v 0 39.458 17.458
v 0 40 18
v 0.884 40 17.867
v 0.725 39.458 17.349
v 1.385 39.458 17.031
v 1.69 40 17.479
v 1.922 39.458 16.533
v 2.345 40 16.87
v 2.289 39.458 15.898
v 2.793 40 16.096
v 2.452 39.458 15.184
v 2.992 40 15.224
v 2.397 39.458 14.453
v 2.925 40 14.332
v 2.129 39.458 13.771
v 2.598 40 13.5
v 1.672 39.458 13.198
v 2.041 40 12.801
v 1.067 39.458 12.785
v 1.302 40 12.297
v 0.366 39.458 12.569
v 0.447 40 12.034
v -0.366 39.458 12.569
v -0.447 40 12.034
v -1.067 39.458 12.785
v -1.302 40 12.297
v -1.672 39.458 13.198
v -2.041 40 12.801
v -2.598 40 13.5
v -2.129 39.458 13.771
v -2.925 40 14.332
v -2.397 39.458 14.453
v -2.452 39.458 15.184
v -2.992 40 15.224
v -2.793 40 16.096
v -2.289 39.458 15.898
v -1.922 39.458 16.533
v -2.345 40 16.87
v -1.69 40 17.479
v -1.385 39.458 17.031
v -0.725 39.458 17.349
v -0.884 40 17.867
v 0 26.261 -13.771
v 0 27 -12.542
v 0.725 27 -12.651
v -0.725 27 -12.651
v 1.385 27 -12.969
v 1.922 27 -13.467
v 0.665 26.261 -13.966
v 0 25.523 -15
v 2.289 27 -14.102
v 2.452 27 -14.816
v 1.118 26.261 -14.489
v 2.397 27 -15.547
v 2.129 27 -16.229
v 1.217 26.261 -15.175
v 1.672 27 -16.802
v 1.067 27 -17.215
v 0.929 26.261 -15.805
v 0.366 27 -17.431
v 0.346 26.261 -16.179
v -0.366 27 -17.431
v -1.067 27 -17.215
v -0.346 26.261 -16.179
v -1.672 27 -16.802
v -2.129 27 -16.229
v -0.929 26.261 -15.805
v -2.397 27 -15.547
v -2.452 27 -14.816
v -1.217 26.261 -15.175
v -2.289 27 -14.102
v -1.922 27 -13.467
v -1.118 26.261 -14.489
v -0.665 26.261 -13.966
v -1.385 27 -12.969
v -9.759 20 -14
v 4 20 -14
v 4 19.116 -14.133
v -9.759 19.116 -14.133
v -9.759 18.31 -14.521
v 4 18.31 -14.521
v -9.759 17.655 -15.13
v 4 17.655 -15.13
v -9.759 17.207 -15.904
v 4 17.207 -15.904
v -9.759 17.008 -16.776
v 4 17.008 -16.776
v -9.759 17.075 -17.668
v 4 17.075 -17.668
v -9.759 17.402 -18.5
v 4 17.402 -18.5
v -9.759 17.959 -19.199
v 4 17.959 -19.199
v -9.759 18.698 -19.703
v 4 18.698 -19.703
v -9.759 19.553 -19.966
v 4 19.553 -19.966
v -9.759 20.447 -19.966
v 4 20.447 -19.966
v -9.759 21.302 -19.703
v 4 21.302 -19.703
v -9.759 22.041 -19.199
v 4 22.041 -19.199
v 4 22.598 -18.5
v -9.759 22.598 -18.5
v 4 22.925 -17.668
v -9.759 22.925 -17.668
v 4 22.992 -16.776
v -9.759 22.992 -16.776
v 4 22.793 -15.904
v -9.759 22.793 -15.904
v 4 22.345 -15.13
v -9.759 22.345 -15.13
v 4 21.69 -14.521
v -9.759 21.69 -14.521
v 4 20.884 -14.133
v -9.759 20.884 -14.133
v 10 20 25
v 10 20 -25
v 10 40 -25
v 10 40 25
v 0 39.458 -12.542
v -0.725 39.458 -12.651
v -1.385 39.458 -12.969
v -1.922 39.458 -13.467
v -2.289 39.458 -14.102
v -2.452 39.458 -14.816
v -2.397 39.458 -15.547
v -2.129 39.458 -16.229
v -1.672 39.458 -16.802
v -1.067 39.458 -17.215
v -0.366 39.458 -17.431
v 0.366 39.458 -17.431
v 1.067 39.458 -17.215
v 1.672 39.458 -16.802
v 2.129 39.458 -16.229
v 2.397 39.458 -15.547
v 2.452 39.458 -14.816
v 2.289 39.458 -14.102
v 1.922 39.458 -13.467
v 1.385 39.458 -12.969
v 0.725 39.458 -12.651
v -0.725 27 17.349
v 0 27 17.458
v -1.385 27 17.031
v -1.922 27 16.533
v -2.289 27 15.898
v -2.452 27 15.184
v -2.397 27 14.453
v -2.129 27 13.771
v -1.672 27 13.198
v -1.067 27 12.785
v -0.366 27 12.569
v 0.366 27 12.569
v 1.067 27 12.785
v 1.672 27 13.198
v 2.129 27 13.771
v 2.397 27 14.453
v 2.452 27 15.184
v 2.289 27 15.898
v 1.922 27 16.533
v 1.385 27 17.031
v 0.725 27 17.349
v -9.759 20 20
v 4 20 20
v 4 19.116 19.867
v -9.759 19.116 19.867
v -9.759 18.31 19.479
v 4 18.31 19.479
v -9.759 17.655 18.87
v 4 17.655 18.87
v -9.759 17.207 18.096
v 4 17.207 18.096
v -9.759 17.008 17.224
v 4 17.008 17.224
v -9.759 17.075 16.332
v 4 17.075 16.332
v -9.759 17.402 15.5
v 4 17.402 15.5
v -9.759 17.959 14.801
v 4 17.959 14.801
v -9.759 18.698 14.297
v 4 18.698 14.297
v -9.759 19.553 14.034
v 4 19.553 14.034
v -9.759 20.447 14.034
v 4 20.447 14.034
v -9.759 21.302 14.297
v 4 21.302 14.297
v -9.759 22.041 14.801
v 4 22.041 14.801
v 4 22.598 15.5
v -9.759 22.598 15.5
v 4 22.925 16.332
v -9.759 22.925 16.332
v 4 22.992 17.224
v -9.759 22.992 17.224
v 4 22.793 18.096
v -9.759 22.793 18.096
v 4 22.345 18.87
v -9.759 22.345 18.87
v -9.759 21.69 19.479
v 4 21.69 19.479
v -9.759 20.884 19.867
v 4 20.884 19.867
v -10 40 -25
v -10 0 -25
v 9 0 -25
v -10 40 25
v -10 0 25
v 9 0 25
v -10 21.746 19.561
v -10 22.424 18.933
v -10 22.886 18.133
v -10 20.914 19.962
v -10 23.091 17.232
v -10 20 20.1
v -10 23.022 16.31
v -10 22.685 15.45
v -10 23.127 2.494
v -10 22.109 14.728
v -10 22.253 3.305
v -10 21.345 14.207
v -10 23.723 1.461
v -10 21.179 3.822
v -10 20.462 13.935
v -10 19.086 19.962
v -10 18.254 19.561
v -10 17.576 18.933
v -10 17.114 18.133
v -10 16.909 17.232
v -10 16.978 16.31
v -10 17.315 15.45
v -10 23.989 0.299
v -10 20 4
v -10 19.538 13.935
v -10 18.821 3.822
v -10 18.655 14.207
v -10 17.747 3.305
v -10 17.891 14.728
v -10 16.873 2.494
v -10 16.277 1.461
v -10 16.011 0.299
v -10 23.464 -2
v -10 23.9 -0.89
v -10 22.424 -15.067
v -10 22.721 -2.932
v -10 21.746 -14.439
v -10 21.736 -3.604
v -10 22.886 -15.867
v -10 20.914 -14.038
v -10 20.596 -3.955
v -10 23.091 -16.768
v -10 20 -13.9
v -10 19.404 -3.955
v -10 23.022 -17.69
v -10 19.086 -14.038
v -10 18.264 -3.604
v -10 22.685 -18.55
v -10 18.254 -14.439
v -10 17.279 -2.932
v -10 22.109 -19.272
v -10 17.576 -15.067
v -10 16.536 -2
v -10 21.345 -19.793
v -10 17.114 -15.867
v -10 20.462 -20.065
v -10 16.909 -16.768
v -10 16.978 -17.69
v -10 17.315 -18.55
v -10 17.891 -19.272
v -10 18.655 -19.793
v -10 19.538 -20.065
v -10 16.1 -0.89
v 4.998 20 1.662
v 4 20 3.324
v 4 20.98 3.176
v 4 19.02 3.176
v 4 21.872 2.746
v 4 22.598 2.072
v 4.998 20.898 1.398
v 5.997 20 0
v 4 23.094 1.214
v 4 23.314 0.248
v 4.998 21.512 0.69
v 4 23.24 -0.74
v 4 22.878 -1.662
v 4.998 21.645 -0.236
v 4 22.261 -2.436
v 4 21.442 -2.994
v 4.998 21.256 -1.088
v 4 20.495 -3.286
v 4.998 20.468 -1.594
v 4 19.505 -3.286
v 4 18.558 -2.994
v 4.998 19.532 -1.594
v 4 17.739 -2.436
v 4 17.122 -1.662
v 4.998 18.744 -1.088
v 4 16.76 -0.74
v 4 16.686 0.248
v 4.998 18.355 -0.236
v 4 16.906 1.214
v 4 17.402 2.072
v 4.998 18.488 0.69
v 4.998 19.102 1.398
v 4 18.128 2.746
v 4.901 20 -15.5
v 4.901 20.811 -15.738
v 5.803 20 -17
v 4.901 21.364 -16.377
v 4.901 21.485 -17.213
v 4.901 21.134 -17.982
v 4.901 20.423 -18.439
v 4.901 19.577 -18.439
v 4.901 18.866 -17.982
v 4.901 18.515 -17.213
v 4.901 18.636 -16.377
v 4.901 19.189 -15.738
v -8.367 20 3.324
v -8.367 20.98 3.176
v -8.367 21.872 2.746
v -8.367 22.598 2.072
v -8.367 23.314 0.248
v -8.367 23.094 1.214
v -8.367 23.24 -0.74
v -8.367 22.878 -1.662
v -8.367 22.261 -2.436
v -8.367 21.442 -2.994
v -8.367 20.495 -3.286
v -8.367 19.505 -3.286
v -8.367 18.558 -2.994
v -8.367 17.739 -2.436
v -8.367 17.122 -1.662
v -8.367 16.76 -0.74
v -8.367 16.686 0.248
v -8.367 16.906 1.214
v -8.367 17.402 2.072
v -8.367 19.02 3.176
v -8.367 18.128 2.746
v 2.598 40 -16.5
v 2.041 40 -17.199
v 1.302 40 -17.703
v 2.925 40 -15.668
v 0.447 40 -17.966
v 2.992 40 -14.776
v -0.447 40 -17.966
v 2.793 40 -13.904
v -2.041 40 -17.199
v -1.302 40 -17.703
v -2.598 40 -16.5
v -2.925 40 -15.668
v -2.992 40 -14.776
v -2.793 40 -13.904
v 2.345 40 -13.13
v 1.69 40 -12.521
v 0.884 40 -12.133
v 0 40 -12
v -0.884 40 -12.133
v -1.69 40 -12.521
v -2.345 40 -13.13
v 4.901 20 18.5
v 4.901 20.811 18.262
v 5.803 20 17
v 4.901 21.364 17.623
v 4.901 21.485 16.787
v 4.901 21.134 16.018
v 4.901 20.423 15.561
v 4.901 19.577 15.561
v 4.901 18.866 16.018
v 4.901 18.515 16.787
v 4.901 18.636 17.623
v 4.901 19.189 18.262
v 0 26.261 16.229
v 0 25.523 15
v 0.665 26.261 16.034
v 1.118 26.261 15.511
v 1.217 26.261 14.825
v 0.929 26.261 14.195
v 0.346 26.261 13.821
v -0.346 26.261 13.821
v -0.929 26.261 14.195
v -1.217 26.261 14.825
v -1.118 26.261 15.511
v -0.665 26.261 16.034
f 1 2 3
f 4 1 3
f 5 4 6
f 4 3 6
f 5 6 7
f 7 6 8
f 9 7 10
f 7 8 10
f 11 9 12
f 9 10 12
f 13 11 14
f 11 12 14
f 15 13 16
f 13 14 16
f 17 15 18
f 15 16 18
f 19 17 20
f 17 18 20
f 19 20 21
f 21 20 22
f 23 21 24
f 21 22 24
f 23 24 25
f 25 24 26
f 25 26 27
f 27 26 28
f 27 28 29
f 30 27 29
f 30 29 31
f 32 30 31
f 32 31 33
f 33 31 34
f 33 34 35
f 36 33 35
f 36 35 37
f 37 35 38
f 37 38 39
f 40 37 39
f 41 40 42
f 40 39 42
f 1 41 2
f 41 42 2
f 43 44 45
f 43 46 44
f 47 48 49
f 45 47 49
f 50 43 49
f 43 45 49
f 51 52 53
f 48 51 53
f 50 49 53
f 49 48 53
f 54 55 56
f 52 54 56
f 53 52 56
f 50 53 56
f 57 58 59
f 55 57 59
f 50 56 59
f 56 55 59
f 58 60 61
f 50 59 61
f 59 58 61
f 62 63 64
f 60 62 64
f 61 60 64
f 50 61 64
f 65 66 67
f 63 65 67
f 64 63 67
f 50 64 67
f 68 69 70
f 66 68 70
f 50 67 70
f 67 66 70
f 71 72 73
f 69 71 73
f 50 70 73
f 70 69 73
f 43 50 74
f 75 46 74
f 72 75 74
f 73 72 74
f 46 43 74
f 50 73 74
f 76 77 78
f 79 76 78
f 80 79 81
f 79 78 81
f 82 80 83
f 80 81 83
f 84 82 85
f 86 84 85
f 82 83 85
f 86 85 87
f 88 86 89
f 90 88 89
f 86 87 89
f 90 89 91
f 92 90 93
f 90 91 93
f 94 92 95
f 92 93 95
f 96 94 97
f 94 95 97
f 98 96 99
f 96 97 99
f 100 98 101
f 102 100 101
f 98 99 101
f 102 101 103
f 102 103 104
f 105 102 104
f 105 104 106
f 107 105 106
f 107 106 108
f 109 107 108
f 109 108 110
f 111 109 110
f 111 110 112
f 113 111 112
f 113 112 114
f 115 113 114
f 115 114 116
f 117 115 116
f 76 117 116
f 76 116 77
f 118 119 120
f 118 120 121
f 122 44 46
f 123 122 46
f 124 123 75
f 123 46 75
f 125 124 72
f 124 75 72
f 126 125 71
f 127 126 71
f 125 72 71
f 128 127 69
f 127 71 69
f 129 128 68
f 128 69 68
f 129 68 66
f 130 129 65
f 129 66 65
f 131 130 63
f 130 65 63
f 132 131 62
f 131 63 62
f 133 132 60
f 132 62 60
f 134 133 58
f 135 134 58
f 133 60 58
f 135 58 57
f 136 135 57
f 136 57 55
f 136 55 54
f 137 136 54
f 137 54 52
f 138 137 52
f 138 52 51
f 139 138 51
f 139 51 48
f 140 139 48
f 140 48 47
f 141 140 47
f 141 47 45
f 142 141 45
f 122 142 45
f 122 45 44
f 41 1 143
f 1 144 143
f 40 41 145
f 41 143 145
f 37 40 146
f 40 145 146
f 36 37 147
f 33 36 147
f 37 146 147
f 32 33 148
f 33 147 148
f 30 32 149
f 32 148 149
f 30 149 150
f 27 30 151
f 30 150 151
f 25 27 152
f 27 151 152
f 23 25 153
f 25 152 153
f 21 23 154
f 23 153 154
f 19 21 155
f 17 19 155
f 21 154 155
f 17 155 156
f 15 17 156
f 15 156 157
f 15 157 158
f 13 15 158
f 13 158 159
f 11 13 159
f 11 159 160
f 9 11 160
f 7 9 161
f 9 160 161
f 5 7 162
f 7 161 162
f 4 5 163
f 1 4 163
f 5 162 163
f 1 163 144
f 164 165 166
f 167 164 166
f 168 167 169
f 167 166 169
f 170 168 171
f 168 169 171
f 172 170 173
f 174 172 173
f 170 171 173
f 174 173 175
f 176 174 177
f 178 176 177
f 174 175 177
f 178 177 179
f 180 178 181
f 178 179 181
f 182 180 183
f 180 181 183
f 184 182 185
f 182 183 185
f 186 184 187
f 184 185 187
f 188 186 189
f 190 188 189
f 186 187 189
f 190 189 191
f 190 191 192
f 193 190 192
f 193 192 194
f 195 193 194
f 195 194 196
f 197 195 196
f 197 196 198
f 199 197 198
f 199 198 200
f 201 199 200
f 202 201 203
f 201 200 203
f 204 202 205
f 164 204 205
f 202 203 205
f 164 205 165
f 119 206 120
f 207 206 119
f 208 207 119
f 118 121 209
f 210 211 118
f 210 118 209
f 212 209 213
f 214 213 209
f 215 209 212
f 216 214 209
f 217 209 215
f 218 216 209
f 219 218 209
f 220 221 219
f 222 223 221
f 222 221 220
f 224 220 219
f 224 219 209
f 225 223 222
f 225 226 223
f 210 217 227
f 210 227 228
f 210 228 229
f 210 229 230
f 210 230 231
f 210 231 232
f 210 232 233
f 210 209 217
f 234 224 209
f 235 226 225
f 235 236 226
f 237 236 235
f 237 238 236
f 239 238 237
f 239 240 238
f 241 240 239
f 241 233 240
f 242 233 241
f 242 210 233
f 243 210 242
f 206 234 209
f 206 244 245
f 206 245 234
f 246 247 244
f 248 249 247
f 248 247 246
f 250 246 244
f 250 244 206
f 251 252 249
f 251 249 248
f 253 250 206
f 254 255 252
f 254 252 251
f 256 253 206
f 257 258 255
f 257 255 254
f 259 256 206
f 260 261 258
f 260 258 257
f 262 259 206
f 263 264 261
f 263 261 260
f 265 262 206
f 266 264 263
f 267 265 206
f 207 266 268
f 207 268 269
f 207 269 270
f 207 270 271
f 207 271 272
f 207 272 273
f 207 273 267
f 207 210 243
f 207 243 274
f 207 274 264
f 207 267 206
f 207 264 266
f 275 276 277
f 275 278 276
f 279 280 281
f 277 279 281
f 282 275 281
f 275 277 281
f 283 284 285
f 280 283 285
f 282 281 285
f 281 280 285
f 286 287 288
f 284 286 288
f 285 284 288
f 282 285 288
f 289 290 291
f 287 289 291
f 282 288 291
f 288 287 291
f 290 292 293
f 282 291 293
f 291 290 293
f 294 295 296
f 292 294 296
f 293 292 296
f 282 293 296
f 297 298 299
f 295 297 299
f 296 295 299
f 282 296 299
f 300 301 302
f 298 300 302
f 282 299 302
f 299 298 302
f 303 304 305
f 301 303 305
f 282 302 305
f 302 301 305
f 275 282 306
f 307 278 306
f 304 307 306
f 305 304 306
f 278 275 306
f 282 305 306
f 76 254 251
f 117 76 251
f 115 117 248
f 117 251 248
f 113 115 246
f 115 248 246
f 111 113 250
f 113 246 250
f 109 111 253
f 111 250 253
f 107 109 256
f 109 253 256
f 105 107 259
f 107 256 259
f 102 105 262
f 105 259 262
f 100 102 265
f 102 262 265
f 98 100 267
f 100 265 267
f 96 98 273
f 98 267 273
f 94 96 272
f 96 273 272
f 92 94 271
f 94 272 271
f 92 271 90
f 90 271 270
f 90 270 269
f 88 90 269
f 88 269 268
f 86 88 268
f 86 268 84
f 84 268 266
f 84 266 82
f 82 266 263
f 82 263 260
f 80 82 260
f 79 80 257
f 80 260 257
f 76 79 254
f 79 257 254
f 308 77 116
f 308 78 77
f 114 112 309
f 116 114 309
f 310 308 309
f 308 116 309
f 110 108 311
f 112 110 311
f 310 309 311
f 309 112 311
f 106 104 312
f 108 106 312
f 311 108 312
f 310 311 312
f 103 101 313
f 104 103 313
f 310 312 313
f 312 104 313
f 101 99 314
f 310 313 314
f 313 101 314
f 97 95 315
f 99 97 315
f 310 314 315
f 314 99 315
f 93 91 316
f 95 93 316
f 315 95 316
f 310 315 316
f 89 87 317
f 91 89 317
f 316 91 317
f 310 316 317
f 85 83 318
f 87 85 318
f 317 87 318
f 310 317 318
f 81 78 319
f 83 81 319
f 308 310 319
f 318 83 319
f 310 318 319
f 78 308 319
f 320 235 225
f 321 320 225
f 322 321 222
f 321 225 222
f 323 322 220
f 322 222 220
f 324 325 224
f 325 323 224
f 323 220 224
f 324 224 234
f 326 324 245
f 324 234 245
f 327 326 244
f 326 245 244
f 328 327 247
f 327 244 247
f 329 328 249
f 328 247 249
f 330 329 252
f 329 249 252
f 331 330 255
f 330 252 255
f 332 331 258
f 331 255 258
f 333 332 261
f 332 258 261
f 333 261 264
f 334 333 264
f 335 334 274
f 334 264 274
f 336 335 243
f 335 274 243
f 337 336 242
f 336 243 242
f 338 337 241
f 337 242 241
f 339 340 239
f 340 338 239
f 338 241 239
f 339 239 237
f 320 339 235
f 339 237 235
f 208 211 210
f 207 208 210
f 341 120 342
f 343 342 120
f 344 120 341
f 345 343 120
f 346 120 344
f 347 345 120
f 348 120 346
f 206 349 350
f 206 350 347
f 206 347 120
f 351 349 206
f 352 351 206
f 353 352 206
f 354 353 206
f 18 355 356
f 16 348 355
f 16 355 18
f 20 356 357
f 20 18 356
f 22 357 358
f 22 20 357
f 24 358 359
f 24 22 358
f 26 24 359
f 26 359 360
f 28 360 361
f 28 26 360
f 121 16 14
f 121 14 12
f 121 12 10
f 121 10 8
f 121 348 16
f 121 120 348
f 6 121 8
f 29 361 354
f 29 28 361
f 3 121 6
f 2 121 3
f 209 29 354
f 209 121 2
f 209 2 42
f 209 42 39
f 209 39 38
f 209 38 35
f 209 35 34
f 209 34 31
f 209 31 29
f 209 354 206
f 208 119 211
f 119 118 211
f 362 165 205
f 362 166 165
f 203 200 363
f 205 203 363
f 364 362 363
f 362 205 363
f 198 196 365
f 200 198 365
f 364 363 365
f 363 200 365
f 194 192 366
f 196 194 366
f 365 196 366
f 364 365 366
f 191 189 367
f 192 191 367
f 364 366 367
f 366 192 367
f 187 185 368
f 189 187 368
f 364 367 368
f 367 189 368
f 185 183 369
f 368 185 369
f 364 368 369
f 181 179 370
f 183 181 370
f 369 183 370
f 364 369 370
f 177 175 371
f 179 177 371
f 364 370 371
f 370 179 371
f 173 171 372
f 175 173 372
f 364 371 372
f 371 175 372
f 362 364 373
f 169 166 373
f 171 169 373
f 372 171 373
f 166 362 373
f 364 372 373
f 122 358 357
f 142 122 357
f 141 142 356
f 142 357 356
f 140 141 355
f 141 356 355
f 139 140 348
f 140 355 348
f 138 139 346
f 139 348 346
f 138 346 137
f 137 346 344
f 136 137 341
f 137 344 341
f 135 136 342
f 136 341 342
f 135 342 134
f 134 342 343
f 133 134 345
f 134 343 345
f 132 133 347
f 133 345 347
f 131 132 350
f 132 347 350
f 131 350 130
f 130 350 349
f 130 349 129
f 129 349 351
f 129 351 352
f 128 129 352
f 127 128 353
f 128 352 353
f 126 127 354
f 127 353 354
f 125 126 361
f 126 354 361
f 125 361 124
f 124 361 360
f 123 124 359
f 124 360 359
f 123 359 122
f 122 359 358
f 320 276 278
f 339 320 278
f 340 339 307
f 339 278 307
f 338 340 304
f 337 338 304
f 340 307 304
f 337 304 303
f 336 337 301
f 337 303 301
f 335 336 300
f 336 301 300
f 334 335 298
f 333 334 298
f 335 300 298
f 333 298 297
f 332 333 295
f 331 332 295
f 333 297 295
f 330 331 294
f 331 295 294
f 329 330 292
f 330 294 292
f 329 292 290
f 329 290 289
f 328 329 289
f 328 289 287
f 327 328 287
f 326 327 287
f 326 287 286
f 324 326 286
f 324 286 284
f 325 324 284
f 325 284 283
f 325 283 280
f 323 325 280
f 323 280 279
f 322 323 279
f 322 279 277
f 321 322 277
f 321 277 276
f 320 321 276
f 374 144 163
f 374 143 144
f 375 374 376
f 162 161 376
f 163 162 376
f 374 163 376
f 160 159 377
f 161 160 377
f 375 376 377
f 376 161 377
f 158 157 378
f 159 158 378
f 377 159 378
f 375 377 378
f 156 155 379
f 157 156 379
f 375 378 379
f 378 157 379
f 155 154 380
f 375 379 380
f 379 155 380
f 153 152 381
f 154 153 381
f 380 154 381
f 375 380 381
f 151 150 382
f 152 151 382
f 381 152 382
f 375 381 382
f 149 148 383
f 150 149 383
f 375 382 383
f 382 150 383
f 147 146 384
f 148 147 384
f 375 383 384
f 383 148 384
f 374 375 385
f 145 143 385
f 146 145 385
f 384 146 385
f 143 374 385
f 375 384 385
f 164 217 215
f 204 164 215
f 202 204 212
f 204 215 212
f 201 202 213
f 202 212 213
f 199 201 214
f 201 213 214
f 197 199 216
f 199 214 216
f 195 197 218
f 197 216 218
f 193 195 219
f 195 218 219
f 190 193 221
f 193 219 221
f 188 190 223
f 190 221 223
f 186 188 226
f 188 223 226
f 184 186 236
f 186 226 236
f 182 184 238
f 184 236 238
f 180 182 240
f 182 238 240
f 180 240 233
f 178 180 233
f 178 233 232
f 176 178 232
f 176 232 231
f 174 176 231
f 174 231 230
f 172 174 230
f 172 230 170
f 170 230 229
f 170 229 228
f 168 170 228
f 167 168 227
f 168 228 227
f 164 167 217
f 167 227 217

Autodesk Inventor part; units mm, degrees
ref_plane "YZ Plane" through (0, 0, 0) normal (1, 0, 0) x (0, 1, 0)
ref_plane "XZ Plane" through (0, 0, 0) normal (0, 1, 0) x (-1, 0, 0)
ref_plane "XY Plane" through (0, 0, 0) normal (0, 0, 1) x (1, 0, 0)
sketch "Sketch2" plane through (0, 0, 0) normal (0, 1, 0) x (-1, 0, 0)
  line L0 (-10, 25) -> (10, 25)
  line L1 (10, 25) -> (10, -25)
  line L2 (10, -25) -> (-10, -25)
  line L3 (-10, -25) -> (-10, 25)
  line L4 (-10, 25) -> (10, -25) construction
  line L5 (10, 25) -> (-10, -25) construction
  point P0 (0, 0)
  dimension "d0" = 50
  dimension "d1" = 20
extrude "Extrusion1" add sketch "Sketch2" along normal blind 40
sketch "Sketch3" plane through (-10, 0, 25) normal (0, 0, 1) x (1, 0, 0)
  line L0 (20, 0) -> (20, 40) projected
  line L1 (20, 40) -> (20, 20)
  line L2 (0, 40) -> (20, 40) projected
  line L3 (20, 20) -> (19, 0)
  line L4 (20, 0) -> (0, 0) projected
  line L5 (19, 0) -> (20, 0)
  line L6 (20, 0) -> (20, 20)
  point P0 (10, 0)
  dimension "d4" = 20
  dimension "d5" = 1
extrude "Extrusion2" cut sketch "Sketch3" against normal through all
sketch "Sketch4" plane through (-10, 0, -25) normal (-1, 0, 0) x (0, 0, 1)
  line L0 (0, 0) -> (0, 40) projected
  line L1 (50, 0) -> (50, 40) projected
  line L2 (25, 0) -> (25, 40) construction
  line L3 (50, 40) -> (0, 40) projected
  line L4 (0, 20) -> (50, 20) construction
  line L5 (0, 0) -> (50, 0) projected
  point P0 (8, 20)
  point P1 (42, 20)
  point P2 (25, 20)
  dimension "d8" = 8
  dimension "d9" = 8
  dimension "d10" = 20
hole "Hole1" at (-10, 20, -17) at (-10, 20, 17) direction (1, 0, 0) diameter 6 depth 14 tip angle 118 countersink diameter 6.2 countersink angle 45
hole "Hole2" at (-10, 20, 0) direction (1, 0, 0) diameter 6.647 depth 14 tip angle 118 countersink diameter 8 countersink angle 45 thread size "M8x1.25" class "6H" standard "ISO Metric profile"
sketch "Sketch5" plane through (0, 40, 0) normal (0, 1, 0) x (1, 0, 0)
  line L0 (10, 25) -> (-10, 25) projected
  line L1 (-10, 25) -> (-10, -25) projected
  line L2 (-10, -25) -> (10, -25) projected
  line L3 (10, -25) -> (10, 25) projected
  line L4 (0, 25) -> (0, -25) construction
  point P0 (0, 0)
  point P1 (0, 15)
  point P2 (0, -15)
  point P3 (0, 0)
  dimension "d25" = 15
  dimension "d26" = 15
hole "Hole3" at (0, 40, -15) at (0, 40, 15) direction (0, -1, 0) diameter 4.917 depth 13 tip angle 118 countersink diameter 6 countersink angle 90 thread size "M6x1" class "6H" standard "ISO Metric profile"
equation "\"d0\" = Länge_Backe"
equation "\"d1\" = Breite_Backe"
equation "\"d2\" = Höhe_Backe"
equation "\"d4\" = Absatz_Höhe"
equation "\"d5\" = 0.5 * Max_Versatz"
equation "\"d8\" = d9"
equation "\"d9\" = Abstand_Bolzen"
equation "\"d10\" = Höhe_Schrauben"
equation "\"d11\" = Bolzen_Durchmesser"
equation "\"d25\" = 0.5 * Abstand_Bohrung_Vertikale_halterung"
equation "\"d26\" = d25"
equation "\"Breite_Backe\" = 20"
equation "\"Höhe_Backe\" = 40"
equation "\"Länge_Backe\" = 50"
equation "\"Absatz_Höhe\" = 20"
equation "\"Max_Versatz\" = 2"
equation "\"Abstand_Bolzen\" = 8"
equation "\"Höhe_Schrauben\" = 20"
equation "\"Bolzen_Durchmesser\" = 6"
equation "\"Abstand_Bohrung_Vertikale_halterung\" = 30"
properties part number "ER_Positionierungseinheit_Backe_int"
